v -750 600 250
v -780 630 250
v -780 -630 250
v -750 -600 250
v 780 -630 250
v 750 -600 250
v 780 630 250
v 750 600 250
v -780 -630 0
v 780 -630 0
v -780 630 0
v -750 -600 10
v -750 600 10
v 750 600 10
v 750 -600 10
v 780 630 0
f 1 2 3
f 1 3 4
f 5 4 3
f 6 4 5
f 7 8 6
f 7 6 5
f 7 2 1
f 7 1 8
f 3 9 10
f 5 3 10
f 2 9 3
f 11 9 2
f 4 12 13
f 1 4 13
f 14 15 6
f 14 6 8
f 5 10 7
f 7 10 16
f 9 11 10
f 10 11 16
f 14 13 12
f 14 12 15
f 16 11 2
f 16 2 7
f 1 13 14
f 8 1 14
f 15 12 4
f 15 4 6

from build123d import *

# Parameters (mm, degrees)
F0_W     = 1560
F0_H     = 1260
F0_W_2   = 1500
F0_H_2   = 1200
F1_DEPTH = 250
F2_DEPTH = 10


with BuildPart() as f1:
    # F0 (on Top) → F1 (new body)
    with BuildSketch(Plane.XY):
        Rectangle(F0_W, F0_H)
        Rectangle(F0_W_2, F0_H_2, mode=Mode.SUBTRACT)
    extrude(amount=F1_DEPTH)

    # F0 (on Top) → F2 (join)
    with BuildSketch(Plane.XY):
        Rectangle(F0_W, F0_H)
        Rectangle(F0_W_2, F0_H_2, mode=Mode.SUBTRACT)
        Rectangle(F0_W_2, F0_H_2)
    extrude(amount=F2_DEPTH)


solid = f1.part
